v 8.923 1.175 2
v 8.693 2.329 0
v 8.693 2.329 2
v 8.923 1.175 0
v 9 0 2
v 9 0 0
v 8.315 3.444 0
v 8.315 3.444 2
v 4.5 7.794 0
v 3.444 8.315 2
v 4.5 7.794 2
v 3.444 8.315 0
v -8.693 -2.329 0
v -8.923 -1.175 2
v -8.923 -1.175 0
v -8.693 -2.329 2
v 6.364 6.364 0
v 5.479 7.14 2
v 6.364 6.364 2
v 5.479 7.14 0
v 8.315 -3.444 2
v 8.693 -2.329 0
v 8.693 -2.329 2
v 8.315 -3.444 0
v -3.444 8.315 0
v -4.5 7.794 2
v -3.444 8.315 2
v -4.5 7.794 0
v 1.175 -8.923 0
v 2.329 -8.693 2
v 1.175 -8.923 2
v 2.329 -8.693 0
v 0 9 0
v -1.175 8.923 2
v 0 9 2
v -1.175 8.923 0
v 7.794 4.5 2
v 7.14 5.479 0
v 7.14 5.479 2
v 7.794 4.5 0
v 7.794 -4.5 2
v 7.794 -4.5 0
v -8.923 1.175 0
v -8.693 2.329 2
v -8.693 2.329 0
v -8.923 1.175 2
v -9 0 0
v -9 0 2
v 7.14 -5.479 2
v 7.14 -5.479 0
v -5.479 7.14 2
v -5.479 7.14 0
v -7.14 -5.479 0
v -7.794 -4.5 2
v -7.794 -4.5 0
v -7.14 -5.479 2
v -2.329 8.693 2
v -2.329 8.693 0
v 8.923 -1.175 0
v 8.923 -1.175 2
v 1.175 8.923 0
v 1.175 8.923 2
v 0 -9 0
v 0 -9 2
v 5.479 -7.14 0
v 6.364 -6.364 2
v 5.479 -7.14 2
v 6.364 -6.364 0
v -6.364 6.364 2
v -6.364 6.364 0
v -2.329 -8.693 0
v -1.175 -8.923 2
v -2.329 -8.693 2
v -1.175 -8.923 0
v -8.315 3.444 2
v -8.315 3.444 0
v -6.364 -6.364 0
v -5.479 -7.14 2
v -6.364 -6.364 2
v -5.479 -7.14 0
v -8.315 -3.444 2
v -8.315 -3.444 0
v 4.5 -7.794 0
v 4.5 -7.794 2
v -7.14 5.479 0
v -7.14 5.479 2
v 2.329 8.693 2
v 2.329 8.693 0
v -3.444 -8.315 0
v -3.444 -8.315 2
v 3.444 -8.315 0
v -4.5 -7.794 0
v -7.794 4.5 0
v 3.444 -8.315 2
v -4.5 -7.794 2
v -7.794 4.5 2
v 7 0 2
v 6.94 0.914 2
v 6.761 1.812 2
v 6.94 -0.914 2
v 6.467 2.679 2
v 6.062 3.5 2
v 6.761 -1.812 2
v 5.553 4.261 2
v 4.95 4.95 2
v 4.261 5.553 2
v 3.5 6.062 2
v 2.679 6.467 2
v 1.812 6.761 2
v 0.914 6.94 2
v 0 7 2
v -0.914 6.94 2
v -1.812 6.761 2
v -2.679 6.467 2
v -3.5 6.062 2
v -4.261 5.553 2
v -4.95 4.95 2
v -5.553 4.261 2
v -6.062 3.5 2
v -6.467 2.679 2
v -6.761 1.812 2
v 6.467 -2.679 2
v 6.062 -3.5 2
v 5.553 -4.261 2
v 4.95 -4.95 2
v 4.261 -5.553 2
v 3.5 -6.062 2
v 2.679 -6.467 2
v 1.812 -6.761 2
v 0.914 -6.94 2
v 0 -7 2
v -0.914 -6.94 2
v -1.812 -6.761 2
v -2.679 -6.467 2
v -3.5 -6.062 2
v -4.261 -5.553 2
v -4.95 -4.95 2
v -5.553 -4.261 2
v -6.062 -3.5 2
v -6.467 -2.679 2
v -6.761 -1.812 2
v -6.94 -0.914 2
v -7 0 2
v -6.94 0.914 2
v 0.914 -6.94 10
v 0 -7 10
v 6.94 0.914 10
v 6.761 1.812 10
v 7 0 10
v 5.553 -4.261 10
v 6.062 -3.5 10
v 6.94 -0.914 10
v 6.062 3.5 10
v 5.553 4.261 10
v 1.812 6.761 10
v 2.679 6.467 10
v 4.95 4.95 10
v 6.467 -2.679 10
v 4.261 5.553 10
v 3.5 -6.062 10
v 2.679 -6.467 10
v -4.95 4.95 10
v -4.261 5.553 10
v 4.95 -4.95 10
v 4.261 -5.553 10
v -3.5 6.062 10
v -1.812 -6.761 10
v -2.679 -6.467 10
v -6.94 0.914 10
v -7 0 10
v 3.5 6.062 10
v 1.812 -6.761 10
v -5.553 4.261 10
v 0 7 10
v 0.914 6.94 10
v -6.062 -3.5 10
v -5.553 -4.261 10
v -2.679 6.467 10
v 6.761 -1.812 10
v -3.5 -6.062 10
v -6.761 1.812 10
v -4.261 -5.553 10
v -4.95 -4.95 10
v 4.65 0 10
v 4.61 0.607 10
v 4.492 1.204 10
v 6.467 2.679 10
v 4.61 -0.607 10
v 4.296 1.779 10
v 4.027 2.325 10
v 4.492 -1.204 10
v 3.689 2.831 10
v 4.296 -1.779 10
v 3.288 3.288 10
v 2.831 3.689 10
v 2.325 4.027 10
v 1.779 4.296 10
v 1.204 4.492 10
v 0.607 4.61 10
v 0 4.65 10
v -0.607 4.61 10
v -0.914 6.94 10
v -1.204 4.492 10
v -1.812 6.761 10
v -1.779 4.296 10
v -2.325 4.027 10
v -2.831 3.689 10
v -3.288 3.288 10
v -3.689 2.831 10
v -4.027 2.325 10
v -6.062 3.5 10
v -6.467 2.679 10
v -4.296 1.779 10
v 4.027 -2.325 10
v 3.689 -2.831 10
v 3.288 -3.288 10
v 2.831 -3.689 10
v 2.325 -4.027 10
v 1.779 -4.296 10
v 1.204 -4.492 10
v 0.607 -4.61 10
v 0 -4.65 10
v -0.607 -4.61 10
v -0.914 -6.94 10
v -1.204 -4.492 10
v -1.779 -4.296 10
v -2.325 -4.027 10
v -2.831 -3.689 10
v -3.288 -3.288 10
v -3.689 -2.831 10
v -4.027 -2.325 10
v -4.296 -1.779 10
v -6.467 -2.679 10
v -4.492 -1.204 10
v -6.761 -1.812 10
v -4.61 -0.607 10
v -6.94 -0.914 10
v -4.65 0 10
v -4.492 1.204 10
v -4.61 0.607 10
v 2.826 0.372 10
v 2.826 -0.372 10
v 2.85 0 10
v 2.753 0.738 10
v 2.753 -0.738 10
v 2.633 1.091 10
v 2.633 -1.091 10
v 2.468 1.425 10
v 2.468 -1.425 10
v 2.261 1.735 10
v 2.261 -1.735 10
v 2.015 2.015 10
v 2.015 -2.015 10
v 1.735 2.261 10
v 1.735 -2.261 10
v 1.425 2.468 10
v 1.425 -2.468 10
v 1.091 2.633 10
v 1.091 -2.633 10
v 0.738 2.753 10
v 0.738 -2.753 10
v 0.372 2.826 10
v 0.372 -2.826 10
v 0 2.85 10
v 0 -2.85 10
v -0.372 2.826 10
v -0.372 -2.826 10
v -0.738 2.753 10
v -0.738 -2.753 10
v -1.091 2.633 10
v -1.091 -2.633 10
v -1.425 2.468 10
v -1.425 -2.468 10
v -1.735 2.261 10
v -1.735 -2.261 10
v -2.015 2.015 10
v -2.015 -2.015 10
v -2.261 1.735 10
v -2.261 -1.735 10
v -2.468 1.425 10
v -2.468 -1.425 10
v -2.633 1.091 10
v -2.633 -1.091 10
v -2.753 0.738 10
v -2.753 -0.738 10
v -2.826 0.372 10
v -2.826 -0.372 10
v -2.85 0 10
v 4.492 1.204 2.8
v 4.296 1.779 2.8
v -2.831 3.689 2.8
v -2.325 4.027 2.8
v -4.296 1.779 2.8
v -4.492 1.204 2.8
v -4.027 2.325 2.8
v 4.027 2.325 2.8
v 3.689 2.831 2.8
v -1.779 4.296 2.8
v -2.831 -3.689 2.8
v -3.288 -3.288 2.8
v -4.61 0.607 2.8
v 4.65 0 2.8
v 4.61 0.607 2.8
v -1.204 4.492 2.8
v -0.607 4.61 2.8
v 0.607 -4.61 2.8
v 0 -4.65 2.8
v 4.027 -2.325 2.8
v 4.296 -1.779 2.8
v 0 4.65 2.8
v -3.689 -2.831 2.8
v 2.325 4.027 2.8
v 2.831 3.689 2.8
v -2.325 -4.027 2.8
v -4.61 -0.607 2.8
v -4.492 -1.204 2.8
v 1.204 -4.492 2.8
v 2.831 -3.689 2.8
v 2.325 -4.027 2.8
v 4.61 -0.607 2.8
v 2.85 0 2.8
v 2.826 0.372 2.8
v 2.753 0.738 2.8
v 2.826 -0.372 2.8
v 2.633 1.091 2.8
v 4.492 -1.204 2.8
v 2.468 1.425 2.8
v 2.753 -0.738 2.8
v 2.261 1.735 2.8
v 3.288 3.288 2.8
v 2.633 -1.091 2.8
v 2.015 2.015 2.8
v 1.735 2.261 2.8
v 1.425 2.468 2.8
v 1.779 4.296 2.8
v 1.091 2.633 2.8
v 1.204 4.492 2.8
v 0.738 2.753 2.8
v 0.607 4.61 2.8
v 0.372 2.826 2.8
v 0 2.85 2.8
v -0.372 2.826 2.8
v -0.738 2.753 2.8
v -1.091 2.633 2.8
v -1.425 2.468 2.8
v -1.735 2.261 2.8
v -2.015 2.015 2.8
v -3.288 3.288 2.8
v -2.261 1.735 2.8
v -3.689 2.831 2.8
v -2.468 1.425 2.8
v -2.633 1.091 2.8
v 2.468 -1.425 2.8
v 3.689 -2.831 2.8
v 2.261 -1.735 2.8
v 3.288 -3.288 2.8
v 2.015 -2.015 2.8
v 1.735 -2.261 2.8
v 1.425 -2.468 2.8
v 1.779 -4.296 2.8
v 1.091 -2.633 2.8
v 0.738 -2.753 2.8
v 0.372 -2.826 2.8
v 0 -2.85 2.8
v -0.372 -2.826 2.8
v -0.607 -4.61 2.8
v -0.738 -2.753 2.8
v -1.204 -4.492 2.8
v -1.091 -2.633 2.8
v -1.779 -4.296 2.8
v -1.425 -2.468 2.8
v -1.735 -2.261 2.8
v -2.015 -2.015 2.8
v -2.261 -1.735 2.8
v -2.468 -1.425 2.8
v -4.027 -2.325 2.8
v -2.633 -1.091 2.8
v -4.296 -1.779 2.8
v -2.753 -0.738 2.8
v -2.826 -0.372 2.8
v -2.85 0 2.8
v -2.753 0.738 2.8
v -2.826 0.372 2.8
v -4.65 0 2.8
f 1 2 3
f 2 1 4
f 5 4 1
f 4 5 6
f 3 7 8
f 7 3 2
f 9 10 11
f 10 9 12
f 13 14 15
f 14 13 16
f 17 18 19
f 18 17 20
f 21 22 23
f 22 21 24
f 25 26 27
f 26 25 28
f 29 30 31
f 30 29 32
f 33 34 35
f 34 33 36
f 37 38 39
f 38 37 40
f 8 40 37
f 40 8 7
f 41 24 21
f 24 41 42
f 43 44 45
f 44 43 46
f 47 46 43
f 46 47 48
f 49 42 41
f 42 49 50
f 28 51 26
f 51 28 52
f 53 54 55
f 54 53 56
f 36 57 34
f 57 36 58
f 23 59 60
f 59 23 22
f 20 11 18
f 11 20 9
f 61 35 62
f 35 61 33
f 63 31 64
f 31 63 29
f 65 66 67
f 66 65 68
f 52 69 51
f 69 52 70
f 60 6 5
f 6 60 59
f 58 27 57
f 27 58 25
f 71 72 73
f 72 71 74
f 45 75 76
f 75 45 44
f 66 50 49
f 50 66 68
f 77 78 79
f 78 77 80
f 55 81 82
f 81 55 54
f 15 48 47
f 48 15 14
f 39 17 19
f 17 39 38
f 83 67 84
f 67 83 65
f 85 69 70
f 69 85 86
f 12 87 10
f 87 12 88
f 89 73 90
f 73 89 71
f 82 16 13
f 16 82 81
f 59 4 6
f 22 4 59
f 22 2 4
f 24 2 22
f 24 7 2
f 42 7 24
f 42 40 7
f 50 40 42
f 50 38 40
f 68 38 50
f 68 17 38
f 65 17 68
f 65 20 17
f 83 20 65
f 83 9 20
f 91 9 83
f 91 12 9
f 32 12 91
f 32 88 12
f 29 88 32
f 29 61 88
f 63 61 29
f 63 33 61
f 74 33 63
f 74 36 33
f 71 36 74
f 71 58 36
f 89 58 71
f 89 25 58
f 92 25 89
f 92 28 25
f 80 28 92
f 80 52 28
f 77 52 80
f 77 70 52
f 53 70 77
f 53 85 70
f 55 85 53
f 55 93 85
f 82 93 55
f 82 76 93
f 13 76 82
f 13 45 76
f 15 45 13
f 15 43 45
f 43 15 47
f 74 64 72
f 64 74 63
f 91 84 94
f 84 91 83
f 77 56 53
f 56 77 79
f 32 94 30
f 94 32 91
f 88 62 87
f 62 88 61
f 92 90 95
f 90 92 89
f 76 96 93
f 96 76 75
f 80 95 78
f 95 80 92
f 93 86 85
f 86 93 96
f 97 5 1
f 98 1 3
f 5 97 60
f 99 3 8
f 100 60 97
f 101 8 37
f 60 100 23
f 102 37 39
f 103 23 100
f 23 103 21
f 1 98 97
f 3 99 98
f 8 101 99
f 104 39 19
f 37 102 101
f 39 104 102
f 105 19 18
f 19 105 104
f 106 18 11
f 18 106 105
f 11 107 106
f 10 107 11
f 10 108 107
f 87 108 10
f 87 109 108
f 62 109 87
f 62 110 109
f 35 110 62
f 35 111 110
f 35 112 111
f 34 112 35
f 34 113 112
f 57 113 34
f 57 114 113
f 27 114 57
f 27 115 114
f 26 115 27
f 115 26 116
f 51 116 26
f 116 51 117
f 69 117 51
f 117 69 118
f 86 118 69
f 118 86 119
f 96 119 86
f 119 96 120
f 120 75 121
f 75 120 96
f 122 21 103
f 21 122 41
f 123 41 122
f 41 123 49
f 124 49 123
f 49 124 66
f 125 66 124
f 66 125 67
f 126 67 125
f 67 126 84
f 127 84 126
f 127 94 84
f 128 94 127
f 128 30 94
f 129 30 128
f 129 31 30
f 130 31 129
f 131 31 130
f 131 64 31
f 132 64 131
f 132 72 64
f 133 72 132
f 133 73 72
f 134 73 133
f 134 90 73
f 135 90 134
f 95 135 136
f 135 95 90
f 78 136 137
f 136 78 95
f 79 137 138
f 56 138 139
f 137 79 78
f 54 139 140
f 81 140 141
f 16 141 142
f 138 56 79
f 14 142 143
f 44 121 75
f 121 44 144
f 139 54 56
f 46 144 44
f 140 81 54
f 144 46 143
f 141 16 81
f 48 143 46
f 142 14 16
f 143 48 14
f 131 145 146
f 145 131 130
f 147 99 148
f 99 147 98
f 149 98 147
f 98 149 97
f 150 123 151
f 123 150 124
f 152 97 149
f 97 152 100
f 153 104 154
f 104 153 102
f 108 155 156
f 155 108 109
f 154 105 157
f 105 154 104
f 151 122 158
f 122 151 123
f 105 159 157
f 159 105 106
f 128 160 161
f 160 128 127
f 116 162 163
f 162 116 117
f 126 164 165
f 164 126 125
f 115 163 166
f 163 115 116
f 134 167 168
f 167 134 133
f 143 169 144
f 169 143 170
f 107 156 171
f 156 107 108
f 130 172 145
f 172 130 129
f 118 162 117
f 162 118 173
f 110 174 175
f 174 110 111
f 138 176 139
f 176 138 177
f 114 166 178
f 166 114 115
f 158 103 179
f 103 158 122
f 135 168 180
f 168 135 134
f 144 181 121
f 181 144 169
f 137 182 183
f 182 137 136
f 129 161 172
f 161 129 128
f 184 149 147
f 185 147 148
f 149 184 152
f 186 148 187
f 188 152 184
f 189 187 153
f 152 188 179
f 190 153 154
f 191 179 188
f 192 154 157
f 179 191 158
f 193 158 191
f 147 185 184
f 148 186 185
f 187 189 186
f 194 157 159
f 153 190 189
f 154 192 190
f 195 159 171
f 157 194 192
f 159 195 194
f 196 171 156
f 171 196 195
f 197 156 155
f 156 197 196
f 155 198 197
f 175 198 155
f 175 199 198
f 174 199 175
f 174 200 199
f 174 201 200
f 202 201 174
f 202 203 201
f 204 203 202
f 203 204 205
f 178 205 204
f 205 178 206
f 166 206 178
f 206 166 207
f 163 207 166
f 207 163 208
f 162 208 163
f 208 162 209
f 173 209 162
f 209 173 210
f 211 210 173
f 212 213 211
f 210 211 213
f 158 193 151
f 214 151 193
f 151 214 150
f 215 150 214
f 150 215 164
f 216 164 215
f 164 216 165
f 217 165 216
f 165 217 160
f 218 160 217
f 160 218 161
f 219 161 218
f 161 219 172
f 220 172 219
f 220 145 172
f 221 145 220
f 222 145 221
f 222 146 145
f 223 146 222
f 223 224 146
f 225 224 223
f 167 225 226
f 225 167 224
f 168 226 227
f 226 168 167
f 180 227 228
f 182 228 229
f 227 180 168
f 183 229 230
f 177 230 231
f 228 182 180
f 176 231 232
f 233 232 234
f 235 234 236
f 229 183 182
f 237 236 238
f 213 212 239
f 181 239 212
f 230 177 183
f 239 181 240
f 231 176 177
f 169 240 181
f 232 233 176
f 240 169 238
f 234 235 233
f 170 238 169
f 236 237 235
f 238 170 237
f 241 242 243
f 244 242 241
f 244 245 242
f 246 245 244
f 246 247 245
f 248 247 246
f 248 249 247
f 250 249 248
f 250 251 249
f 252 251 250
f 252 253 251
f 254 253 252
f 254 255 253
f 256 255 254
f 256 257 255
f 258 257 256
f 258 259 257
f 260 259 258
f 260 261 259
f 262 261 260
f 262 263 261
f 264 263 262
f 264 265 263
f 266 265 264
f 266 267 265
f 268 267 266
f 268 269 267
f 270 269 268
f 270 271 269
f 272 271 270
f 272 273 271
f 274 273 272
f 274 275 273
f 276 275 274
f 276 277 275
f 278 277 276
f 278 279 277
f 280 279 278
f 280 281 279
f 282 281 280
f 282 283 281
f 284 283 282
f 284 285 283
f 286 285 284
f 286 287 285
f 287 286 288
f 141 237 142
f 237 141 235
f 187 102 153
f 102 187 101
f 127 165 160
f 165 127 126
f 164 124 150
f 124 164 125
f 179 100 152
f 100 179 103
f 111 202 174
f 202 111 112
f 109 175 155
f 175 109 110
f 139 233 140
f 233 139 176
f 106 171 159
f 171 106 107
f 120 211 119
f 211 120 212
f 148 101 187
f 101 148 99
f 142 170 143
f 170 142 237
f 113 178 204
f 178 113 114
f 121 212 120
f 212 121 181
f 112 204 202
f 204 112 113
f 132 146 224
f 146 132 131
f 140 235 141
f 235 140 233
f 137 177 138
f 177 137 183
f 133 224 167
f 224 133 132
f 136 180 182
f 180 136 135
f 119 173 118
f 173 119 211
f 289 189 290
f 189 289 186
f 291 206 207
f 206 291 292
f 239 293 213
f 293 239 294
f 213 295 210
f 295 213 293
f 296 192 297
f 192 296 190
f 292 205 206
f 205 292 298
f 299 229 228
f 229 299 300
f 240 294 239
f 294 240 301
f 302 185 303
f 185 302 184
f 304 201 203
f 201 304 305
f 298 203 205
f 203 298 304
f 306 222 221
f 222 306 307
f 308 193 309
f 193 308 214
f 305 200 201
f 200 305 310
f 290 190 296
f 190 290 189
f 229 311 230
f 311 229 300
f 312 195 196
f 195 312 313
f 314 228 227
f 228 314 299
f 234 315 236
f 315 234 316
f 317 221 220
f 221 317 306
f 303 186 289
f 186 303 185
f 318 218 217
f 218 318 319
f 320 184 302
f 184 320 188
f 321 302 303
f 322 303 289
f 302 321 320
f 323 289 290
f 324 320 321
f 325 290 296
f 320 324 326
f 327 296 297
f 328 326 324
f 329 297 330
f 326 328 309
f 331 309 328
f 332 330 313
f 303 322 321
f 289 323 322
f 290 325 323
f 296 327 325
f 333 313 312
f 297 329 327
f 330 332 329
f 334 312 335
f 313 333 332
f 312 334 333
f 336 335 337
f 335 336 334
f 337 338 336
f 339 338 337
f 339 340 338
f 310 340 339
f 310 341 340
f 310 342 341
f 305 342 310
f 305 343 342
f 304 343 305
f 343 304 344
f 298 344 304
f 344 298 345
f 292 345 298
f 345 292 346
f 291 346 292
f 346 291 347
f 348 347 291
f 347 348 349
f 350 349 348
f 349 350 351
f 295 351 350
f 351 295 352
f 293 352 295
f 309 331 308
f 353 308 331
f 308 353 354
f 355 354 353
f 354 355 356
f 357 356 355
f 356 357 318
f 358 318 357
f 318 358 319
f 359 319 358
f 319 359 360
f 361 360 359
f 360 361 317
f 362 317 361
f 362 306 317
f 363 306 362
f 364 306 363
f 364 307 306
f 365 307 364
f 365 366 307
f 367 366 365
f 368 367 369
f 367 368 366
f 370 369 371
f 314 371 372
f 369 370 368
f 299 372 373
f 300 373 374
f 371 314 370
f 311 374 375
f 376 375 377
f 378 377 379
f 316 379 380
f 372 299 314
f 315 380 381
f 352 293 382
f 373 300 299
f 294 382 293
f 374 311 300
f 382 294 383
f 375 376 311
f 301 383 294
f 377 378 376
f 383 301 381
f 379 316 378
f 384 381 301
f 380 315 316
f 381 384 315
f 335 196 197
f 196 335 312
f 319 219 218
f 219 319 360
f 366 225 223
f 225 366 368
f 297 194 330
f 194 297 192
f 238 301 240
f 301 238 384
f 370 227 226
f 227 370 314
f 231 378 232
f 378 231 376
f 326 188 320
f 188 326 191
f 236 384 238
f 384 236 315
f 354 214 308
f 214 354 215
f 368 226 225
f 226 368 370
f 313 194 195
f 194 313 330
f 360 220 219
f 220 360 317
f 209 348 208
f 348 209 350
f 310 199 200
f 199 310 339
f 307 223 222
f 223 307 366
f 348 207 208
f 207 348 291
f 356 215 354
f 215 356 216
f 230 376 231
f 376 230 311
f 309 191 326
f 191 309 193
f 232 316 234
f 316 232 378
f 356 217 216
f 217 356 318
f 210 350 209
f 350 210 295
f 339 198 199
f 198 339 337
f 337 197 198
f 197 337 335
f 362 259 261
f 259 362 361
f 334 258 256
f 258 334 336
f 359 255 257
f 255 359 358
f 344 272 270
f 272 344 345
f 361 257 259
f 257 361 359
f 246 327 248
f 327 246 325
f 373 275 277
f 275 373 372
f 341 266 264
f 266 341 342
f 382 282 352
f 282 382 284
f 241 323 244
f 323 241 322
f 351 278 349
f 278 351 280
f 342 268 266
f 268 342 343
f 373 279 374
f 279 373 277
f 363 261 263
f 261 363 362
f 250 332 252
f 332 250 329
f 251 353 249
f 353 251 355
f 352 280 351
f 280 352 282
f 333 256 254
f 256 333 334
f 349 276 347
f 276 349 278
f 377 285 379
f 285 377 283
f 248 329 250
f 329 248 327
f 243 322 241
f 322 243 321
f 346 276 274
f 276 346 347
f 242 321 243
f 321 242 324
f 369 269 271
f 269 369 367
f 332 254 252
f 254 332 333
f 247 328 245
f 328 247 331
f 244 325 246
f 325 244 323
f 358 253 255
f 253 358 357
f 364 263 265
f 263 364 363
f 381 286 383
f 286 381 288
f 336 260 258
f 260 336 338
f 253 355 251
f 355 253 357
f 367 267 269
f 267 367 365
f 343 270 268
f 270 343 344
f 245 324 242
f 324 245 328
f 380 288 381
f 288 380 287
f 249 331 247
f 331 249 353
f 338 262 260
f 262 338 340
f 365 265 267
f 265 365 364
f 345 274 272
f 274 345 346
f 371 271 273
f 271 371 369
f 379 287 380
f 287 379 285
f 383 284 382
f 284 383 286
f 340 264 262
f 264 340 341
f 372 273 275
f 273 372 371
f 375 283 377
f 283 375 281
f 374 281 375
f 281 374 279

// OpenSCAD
// ORIGINAL TechHand/PRINT trainer CAD v0 — training tool only
// Swappable compression spring seat / retainer cup.
// Starting springs: OD 8–10 mm, free length 12–20 mm, light dry-fire return rate.

/* ===== PARAMETERS ===== */
spring_od = 9.0;           // nominal spring OD (mm) — try 8, 9, 10
spring_id_clear = 0.3;     // diametral clearance over spring OD for pocket
seat_od = 14;              // outer diameter of seat cup
seat_h = 8;                // cup height
flange_od = 18;            // flange for retention in shell pocket
flange_h = 2.0;
guide_d = 4.5;             // optional center guide post OD (for spring ID ~5+)
guide_h = 6;
wall = 1.6;
$fn = 48;

pocket_id = spring_od + spring_id_clear;

difference() {
    union() {
        cylinder(h=flange_h, d=flange_od);
        translate([0, 0, flange_h])
            cylinder(h=seat_h, d=seat_od);
        // Center guide post (helps keep spring coaxial)
        translate([0, 0, flange_h])
            cylinder(h=guide_h, d=guide_d);
    }
    // Spring cavity annulus
    translate([0, 0, flange_h + 0.8])
        difference() {
            cylinder(h=seat_h, d=pocket_id);
            cylinder(h=seat_h + 0.1, d=guide_d + 1.2);
        }
}
